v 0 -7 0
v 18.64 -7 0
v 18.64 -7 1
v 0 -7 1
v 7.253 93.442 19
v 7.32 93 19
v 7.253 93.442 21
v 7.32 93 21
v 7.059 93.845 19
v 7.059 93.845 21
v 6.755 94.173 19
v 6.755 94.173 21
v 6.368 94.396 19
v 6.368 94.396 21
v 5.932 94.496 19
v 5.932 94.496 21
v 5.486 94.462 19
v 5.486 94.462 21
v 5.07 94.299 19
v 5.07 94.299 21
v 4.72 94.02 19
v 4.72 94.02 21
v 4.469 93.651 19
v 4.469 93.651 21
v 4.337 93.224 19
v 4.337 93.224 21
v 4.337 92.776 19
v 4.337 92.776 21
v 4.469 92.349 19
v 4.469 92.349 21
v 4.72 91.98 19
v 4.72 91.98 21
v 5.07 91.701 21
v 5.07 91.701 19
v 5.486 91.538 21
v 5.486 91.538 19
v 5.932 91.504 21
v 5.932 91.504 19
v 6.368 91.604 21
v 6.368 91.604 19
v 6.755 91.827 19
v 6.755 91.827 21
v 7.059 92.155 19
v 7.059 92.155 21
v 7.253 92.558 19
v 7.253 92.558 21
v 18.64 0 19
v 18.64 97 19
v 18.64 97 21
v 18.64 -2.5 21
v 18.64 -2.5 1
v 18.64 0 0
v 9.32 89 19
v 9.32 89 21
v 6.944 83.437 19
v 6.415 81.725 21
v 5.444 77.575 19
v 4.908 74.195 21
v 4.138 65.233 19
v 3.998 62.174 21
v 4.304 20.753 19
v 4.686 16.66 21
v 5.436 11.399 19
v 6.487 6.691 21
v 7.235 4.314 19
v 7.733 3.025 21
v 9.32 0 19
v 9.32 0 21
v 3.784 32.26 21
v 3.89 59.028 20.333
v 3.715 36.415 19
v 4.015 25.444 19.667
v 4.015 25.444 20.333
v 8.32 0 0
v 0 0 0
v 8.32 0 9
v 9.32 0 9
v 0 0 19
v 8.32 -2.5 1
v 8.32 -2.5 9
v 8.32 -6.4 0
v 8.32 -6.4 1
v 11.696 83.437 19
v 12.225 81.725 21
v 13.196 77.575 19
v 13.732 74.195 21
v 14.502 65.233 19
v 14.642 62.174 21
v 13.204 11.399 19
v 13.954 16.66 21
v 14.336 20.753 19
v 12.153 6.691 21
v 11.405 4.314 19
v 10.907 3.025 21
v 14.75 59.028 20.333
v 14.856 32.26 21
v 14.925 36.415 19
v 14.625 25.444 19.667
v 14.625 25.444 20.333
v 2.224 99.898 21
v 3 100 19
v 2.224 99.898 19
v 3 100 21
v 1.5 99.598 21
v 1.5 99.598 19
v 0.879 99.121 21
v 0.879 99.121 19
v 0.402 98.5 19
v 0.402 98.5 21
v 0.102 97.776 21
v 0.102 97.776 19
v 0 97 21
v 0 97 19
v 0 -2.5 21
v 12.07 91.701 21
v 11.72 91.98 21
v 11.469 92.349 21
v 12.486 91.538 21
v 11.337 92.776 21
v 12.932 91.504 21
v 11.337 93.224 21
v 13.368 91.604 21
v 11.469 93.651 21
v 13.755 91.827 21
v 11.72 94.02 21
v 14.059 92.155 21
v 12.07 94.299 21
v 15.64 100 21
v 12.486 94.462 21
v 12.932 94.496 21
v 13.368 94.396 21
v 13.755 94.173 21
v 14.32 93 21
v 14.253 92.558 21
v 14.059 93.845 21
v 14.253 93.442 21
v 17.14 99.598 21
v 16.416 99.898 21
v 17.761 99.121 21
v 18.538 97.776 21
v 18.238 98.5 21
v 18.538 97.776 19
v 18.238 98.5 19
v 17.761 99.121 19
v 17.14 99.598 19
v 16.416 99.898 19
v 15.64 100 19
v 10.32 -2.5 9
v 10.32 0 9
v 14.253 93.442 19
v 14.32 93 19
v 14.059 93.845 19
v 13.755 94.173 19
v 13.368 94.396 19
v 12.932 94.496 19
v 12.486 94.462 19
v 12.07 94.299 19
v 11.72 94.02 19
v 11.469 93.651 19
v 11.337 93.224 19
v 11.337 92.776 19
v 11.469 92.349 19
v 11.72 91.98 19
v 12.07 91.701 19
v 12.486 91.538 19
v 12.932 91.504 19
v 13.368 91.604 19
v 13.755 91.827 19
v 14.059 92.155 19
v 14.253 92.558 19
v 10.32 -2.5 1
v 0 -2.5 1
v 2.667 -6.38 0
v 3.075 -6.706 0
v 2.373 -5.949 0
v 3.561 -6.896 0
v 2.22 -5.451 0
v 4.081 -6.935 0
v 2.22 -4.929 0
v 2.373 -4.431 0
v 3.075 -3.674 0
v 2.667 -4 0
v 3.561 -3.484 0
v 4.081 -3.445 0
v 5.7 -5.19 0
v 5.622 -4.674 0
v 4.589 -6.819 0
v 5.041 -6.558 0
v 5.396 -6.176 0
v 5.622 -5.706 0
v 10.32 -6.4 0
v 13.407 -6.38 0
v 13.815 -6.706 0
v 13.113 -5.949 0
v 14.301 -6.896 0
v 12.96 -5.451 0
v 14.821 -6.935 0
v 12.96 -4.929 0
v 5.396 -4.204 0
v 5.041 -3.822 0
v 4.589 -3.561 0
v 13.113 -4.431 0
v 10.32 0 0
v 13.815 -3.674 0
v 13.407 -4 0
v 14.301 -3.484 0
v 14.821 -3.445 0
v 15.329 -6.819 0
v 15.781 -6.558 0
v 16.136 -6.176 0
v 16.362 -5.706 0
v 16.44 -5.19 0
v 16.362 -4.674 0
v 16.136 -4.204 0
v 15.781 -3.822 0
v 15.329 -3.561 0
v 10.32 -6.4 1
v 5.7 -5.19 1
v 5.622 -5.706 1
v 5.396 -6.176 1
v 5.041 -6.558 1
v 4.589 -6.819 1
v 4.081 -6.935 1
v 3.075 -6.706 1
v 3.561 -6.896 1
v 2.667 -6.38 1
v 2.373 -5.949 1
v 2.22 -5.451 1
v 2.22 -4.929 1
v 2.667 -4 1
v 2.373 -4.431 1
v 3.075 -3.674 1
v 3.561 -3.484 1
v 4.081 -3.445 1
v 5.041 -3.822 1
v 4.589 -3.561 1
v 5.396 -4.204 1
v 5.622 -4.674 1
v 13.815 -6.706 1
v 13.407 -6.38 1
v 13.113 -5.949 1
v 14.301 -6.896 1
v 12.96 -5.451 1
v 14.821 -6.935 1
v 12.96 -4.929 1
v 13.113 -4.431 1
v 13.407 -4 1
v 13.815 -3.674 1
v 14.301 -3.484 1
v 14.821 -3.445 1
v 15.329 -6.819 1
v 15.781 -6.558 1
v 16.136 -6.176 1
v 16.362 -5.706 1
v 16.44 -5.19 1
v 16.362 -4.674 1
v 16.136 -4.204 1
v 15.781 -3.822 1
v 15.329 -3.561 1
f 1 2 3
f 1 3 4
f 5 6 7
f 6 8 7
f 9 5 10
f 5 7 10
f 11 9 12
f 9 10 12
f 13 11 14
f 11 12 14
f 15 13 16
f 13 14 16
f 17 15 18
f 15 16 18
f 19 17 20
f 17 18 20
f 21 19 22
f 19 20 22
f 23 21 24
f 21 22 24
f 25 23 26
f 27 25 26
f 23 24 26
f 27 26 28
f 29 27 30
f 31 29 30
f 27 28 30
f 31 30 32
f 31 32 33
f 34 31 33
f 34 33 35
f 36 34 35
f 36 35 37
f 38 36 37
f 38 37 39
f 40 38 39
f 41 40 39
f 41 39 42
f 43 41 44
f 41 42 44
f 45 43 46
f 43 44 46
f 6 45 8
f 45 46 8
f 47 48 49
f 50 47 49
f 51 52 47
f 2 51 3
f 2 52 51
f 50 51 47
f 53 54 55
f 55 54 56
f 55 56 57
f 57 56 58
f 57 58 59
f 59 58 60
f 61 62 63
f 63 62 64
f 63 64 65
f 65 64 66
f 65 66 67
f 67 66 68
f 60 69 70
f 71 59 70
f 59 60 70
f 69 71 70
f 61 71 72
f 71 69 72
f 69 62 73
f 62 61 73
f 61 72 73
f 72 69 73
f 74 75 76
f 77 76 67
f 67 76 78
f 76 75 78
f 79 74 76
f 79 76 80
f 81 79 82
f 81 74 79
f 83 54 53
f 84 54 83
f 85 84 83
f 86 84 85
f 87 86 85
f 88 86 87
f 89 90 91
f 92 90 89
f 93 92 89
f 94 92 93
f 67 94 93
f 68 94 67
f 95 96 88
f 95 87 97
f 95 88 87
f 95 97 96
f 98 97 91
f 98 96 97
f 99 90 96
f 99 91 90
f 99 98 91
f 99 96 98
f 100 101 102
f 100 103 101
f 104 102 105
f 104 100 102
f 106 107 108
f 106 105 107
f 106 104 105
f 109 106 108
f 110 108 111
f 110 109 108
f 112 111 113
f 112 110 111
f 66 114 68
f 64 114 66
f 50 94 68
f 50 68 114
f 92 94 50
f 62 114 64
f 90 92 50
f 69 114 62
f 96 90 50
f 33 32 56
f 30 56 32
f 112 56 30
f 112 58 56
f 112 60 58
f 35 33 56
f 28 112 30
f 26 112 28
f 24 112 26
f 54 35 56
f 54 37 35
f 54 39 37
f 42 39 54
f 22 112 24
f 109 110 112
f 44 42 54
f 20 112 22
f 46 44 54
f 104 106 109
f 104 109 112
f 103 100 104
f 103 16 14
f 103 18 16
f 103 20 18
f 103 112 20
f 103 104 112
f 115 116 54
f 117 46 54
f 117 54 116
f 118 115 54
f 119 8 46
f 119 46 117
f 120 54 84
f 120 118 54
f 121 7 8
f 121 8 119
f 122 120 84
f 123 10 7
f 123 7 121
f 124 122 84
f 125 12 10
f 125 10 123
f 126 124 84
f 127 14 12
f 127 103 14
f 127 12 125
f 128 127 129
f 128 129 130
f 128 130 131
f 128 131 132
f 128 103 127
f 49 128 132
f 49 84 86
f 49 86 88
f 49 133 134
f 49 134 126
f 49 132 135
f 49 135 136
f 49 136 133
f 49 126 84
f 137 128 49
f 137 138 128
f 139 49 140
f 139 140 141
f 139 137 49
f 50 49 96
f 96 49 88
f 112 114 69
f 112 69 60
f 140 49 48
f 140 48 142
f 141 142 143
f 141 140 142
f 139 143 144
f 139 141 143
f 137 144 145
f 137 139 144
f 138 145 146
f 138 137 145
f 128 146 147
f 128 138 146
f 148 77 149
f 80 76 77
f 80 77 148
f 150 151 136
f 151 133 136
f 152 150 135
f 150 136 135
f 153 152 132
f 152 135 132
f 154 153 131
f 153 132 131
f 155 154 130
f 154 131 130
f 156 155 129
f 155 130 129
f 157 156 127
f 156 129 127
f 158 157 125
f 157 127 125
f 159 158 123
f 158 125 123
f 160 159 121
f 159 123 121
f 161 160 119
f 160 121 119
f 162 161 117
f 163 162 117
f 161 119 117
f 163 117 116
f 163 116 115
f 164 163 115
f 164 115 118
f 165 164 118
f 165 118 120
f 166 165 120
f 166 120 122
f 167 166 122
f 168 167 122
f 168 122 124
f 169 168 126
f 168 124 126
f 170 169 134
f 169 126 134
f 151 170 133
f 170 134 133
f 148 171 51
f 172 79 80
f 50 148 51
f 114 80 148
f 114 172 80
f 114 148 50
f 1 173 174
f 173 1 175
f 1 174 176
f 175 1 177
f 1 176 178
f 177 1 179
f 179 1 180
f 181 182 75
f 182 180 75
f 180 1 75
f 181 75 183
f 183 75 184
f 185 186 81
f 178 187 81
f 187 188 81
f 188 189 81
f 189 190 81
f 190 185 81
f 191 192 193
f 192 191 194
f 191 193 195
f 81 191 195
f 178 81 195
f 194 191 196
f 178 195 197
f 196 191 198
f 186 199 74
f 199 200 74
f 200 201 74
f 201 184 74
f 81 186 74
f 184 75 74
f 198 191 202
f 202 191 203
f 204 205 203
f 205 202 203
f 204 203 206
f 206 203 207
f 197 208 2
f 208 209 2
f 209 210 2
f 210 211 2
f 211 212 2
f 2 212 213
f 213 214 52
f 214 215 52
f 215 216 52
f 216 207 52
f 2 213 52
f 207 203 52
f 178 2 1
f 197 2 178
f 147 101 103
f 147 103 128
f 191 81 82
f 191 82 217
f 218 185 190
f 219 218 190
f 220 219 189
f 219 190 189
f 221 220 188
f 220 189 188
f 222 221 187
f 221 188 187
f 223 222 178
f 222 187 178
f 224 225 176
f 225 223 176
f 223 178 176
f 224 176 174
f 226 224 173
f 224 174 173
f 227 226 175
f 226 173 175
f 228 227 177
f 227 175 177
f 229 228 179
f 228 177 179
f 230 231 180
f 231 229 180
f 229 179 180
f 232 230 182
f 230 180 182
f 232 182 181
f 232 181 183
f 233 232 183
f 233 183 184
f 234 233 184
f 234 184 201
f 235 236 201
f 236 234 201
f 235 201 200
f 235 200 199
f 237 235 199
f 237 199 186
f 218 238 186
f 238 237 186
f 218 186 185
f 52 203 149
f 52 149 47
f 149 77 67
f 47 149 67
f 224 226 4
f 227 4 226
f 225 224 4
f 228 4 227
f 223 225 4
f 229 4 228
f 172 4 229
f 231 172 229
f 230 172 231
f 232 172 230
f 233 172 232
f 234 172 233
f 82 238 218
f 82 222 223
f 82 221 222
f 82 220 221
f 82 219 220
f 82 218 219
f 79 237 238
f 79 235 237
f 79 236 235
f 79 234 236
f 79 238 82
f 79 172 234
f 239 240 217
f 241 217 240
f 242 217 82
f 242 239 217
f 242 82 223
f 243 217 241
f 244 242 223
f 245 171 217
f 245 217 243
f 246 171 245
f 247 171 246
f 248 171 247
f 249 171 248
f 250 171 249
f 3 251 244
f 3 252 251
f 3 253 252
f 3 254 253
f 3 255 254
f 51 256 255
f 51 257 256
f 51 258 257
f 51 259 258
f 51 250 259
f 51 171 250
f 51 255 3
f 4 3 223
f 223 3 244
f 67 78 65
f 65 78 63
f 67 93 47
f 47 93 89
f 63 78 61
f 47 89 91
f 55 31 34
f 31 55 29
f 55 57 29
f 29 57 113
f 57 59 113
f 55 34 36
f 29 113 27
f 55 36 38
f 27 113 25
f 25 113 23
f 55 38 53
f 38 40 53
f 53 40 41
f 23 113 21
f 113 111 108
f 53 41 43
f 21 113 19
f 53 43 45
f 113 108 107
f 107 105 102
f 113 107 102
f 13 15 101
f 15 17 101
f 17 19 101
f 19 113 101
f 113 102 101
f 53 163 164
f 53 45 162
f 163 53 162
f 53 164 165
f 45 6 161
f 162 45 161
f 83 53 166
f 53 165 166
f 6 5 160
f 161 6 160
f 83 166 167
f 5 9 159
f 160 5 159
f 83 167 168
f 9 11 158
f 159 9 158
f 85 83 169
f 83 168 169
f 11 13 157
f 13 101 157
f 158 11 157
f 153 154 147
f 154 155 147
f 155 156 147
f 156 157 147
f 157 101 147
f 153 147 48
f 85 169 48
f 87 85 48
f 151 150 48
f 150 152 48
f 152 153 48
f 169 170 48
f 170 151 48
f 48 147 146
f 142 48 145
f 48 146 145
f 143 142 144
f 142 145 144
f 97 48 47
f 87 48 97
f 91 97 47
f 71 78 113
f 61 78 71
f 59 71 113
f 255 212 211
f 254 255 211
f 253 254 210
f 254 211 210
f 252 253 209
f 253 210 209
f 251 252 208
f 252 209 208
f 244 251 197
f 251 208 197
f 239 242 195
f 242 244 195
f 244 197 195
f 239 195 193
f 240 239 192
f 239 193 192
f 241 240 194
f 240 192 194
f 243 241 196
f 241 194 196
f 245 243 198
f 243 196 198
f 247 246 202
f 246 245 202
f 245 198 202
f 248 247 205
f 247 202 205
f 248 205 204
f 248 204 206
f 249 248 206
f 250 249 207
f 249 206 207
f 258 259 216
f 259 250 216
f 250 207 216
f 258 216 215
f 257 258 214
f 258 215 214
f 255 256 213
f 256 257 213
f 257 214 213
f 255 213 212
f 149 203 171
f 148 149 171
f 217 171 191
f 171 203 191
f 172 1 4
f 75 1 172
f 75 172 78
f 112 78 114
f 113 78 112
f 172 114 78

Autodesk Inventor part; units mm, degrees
ref_plane "YZ Plane" through (0, 0, 0) normal (1, 0, 0) x (0, 1, 0)
ref_plane "XZ Plane" through (0, 0, 0) normal (0, 1, 0) x (-1, 0, 0)
ref_plane "XY Plane" through (0, 0, 0) normal (0, 0, 1) x (1, 0, 0)
sketch "Sketch1" plane through (0, 0, 0) normal (0, 0, 1) x (1, 0, 0)
  line L0 (0, 0) -> (18.64, 0)
  line L1 (18.64, 0) -> (18.64, -7)
  line L2 (18.64, -7) -> (0, -7)
  line L3 (0, -7) -> (0, 0)
  circle A0 centre (3.95, -5.19) radius 1.75
  line L4 (9.32, 0) -> (9.32, 1.7268)
  line L5 (9.32, 0) -> (8.32, 0)
  line L6 (8.32, 0) -> (8.32, -6.4)
  line L7 (8.32, -6.4) -> (9.32, -6.4)
  line L8 (9.32, -6.4) -> (9.32, 0)
  circle A1 centre (14.69, -5.19) radius 1.75
  line L9 (10.32, 0) -> (10.32, -6.4)
  line L10 (10.32, -6.4) -> (9.32, -6.4)
  point P0 (8.82, -6.4)
  dimension "d0" = 18.64
  dimension "d1" = 7
  dimension "d2" = 5.19
  dimension "d3" = 3.5
  dimension "d4" = 3.95
  dimension "d5" = 0.6
  dimension "d6" = 1
extrude "Extrusion1" add sketch "Sketch1" along normal blind 1 contours L0 L6 L7 L10 L9 L1 L2 L3
sketch "Sketch2" plane through (0, 0, 1) normal (0, 0, 1) x (1, 0, 0)
  line L0 (0, -7) -> (18.64, -7) projected
  line L1 (18.64, -7) -> (18.64, 0) projected
  line L2 (18.64, 0) -> (10.32, 0) projected
  line L3 (10.32, -6.4) -> (8.32, -6.4) projected
  line L4 (8.32, -6.4) -> (8.32, 0) projected
  line L5 (8.32, 0) -> (0, 0) projected
  line L6 (0, 0) -> (0, -7) projected
  circle A0 centre (3.95, -5.19) radius 1.75 projected
  circle A1 centre (14.69, -5.19) radius 1.75 projected
  line L7 (8.32, 0) -> (0, 0) projected
  line L8 (8.32, -6.4) -> (8.32, 0) projected
  line L9 (0, 0) -> (8.32, 0)
  line L10 (8.32, 0) -> (8.32, -2.5)
  line L11 (8.32, -2.5) -> (0, -2.5)
  line L12 (0, -2.5) -> (0, 0)
  line L13 (9.32, 0) -> (9.32, -6.4) projected
  line L14 (18.64, -7) -> (18.64, 0) projected
  line L15 (9.32, 0) -> (18.64, 0)
  line L16 (18.64, 0) -> (18.64, -2.5)
  line L17 (18.64, -2.5) -> (9.32, -2.5)
  line L18 (9.32, -2.5) -> (9.32, 0)
  line L19 (10.32, 0) -> (10.32, -6.4) projected
  point P0 (0, -2.5)
  point P1 (10.32, -2.5)
  dimension "d9" = 2.5
  dimension "d10" = 2.5
extrude "Extrusion2" add sketch "Sketch2" along normal blind 18 contours L6 L5 L4 L11 | L17 L19 L2 L1
sketch "Sketch3" plane through (8.32, -6.4, 0) normal (1, 0, 0) x (0, 0, -1)
  line L0 (0, 0) -> (0, 6.4) projected
  line L1 (0, 6.4) -> (-19, 6.4) projected
  line L2 (-19, 3.9) -> (-19, 6.4) projected
  line L3 (-1, 3.9) -> (-19, 3.9) projected
  line L4 (-1, 0) -> (-1, 3.9) projected
  line L5 (0, 0) -> (-1, 0) projected
  line L6 (-1, 3.9) -> (-19, 3.9) projected
  line L7 (-19, 6.4) -> (-9, 6.4)
  line L8 (-9, 6.4) -> (-9, 3.9)
  line L9 (-9, 3.9) -> (-19, 3.9)
  line L10 (-19, 3.9) -> (-19, 6.4)
  point P0 (0, 6.4)
  dimension "d13" = 10
extrude "Extrusion3" add sketch "Sketch3" along normal blind 2 contours L8 L3 L2 L1
sketch "Sketch4" plane through (0, 0, 19) normal (0, 0, 1) x (1, 0, 0)
  line L0 (18.64, 0) -> (10.32, 0) projected
  line L1 (18.64, 0) -> (0, 0)
  line L2 (0, 0) -> (0, 100)
  line L3 (0, 100) -> (18.64, 100)
  line L4 (18.64, 100) -> (18.64, 0)
  line L5 (10.32, -2.5) -> (10.32, 0) projected
  line L6 (18.64, 0) -> (0, 0) projected
  line L7 (0, 0) -> (0, -2.5) projected
  line L8 (0, -2.5) -> (18.64, -2.5) projected
  line L9 (18.64, -2.5) -> (18.64, 0) projected
  dimension "d16" = 100
extrude "Extrusion4" add sketch "Sketch4" along normal blind 2
sketch "Sketch5" plane through (0, 0, 21) normal (0, 0, 1) x (1, 0, 0)
  circle A0 centre (12.82, 93) radius 1.5
  circle A1 centre (5.82, 93) radius 1.5
  line L0 (12.82, 93) -> (5.82, 93)
  line L1 (18.64, 100) -> (0, 100) projected
  line L2 (9.32, 100) -> (9.32, 93)
  point P0 (0, 0)
  dimension "d19" = 3
  dimension "d20" = 3
  dimension "d21" = 7
  dimension "d22" = 7
extrude "Extrusion5" cut sketch "Sketch5" against normal blind 13.75
sketch "Sketch6" plane through (0, 0, 21) normal (0, 0, 1) x (1, 0, 0)
  line L0 (18.64, 100) -> (0, 100) projected
  line L1 (9.32, 100) -> (9.32, -19)
  line L2 (9.32, 89) -> (13, 82) construction
  line L3 (13, 82) -> (15, 69) construction
  line L4 (15, 69) -> (15, 40.5) construction
  line L5 (15, 40.5) -> (15, 17) construction
  line L6 (15, 17) -> (12, 4) construction
  line L7 (8.32, 0) -> (10.32, 0) projected
  line L8 (12, 4) -> (9.32, 0) construction
  spline S0 degree 4 poles (9.32, 89) (13, 82) (15, 69) (15, 40.5) (15, 17) (12, 4) (9.32, 0) knots 1 1 1 1 1 2 3 4 4 4 4 4
  line L9 (9.32, 89) -> (5.64, 82) construction
  line L10 (5.64, 82) -> (3.64, 69) construction
  line L11 (3.64, 69) -> (3.64, 40.5) construction
  line L12 (3.64, 40.5) -> (3.64, 17) construction
  line L13 (3.64, 17) -> (6.64, 4) construction
  line L14 (6.64, 4) -> (9.32, 0) construction
  spline S1 degree 4 poles (9.32, 89) (5.64, 82) (3.64, 69) (3.64, 40.5) (3.64, 17) (6.64, 4) (9.32, 0) knots 1 1 1 1 1 2 3 4 4 4 4 4
  point P0 (0, 0)
extrude "Extrusion6" cut sketch "Sketch6" against normal blind 13.75
fillet "Fillet1" radius 3 2 edges at (0, 100, 20) (18.64, 100, 20)
properties part number "Straight_Distance_Sensor_hold" material "Default New Material"
